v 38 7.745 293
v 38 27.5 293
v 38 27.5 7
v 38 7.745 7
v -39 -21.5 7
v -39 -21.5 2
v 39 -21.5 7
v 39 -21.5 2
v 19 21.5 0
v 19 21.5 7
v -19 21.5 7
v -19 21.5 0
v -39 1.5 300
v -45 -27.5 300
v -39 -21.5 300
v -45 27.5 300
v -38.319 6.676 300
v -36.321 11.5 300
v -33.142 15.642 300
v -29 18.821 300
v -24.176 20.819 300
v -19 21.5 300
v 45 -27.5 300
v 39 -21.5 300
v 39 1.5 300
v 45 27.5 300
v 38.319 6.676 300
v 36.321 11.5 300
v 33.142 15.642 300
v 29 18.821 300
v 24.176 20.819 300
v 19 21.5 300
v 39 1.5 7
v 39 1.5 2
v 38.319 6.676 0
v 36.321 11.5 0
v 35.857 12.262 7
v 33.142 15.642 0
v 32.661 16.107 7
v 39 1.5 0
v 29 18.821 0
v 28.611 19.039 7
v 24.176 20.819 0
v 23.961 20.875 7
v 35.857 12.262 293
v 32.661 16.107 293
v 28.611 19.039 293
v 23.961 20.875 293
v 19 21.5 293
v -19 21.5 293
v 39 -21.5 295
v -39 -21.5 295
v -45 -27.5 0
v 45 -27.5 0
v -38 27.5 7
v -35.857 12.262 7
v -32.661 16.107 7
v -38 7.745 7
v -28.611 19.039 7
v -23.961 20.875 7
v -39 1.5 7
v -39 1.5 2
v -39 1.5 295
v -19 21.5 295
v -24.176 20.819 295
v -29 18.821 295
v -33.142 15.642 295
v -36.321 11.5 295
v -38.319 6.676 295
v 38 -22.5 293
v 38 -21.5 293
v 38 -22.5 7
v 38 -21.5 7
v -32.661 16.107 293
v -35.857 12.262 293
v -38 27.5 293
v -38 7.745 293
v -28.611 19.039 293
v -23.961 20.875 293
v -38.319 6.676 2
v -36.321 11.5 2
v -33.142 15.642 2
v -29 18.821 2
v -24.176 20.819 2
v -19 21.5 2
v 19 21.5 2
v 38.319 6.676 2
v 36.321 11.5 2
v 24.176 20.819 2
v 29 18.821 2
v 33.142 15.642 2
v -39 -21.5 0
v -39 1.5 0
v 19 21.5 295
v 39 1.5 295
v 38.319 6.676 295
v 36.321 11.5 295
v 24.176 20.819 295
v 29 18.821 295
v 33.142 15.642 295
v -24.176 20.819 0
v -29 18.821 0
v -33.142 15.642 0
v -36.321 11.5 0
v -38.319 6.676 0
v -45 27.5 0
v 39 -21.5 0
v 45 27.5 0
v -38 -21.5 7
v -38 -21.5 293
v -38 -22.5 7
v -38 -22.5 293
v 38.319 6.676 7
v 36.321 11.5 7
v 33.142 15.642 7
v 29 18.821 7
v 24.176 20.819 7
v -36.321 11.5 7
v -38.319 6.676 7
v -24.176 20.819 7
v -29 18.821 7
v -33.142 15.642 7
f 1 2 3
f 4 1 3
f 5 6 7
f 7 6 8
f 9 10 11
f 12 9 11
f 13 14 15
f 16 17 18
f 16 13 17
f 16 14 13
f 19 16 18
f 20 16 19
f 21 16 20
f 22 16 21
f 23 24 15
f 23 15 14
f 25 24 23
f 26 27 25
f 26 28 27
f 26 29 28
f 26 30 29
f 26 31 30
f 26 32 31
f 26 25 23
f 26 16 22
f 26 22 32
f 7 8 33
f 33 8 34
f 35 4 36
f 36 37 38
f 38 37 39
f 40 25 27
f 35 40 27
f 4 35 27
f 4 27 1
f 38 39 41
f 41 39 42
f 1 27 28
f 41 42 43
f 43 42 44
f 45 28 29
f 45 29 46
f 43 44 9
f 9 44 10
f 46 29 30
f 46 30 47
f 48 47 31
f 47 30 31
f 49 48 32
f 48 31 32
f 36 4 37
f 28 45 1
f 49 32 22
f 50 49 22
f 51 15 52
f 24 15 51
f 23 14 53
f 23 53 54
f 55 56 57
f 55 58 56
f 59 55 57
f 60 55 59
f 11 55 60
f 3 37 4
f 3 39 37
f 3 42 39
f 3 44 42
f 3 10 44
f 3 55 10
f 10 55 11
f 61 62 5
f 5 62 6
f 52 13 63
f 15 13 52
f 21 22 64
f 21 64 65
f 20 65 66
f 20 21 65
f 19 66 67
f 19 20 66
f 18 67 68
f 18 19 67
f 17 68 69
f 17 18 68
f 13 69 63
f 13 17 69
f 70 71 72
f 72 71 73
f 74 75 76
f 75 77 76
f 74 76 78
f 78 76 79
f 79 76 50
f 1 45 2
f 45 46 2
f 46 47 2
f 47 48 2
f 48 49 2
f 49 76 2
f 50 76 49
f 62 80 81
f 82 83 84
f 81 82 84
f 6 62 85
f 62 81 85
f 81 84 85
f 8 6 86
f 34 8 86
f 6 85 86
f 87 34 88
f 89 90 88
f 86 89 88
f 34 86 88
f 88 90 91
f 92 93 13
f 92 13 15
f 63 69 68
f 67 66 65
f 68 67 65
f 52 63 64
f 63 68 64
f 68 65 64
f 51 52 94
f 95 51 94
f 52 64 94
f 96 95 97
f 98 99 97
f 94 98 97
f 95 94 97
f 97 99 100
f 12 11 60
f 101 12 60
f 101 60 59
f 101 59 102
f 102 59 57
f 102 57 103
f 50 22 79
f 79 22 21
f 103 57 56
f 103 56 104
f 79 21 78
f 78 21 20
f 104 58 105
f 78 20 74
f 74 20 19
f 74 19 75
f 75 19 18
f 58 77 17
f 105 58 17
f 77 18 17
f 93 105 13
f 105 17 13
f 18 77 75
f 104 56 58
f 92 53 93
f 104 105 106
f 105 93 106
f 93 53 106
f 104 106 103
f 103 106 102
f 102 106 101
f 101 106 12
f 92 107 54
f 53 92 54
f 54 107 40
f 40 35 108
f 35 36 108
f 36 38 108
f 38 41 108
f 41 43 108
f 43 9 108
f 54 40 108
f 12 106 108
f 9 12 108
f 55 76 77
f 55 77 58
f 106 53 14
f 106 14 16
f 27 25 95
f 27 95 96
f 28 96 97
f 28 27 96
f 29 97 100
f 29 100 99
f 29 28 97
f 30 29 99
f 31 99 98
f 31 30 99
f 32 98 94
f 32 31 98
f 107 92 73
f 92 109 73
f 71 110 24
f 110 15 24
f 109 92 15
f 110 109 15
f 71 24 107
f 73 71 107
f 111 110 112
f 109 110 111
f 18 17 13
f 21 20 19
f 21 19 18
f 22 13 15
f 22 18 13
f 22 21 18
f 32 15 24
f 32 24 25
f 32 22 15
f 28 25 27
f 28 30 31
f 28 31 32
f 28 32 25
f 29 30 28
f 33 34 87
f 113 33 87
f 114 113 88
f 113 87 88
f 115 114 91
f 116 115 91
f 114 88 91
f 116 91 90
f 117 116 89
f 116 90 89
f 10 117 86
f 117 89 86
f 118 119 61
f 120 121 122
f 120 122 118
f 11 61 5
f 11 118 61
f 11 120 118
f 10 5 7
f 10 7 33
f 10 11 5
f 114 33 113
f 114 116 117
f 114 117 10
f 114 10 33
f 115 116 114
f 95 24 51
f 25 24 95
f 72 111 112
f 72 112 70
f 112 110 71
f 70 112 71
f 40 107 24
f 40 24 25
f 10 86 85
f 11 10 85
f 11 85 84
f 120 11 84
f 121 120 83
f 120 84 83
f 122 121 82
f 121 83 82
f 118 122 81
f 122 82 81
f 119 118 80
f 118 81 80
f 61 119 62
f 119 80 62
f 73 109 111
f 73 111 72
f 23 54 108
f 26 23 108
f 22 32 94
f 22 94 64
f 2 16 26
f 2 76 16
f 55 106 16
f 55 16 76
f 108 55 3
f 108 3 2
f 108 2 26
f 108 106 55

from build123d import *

# Parameters (mm, degrees)
ESQUISSE1_W             = 90
ESQUISSE1_H             = 55
BOSS_EXTRU_1_DEPTH      = 300
ESQUISSE3_W             = 76
ESQUISSE3_H             = 286
ENL_V_MAT_EXTRU_1_DEPTH = 50
ENL_V_MAT_EXTRU_2_DEPTH = 475
BOSS_EXTRU_2_DEPTH      = 5


with BuildPart() as part:
    # Esquisse1 → Boss.-Extru.1 (new body)
    with BuildSketch(Plane.XY):
        Rectangle(ESQUISSE1_W, ESQUISSE1_H)
    extrude(amount=BOSS_EXTRU_1_DEPTH)

    # Esquisse3 → Enlèv. mat.-Extru.1 (cut)
    with BuildSketch(Plane(origin=(0, 27.5, 0), x_dir=(1, 0, 0), z_dir=(0, 1, 0))):
        with Locations((0, -150)):
            Rectangle(ESQUISSE3_W, ESQUISSE3_H)
    extrude(amount=-ENL_V_MAT_EXTRU_1_DEPTH, mode=Mode.SUBTRACT)

    # Esquisse4 → Enlèv. mat.-Extru.2 (cut)
    with BuildSketch(Plane.XY.offset(300)):
        with BuildLine():
            Line((-39, 1.5), (-39, -21.5))
            Line((-39, -21.5), (39, -21.5))
            Line((39, -21.5), (39, 1.5))
            ThreePointArc((39, 1.5), (33.142135624, 15.642135624), (19, 21.5))
            Line((19, 21.5), (-19, 21.5))
            ThreePointArc((-19, 21.5), (-33.142135624, 15.642135624), (-39, 1.5))
        make_face()
    extrude(amount=-ENL_V_MAT_EXTRU_2_DEPTH, mode=Mode.SUBTRACT)


with BuildPart() as body_2:
    # Esquisse5 → Boss.-Extru.2 (new body)
    with BuildSketch(Plane.XY.offset(300)):
        with BuildLine():
            Line((-39, 1.5), (-39, -21.5))
            Line((-39, -21.5), (39, -21.5))
            Line((39, -21.5), (39, 1.5))
            ThreePointArc((39, 1.5), (33.142135624, 15.642135624), (19, 21.5))
            Line((19, 21.5), (-19, 21.5))
            ThreePointArc((-19, 21.5), (-33.142135624, 15.642135624), (-39, 1.5))
        make_face()
    extrude(amount=-BOSS_EXTRU_2_DEPTH)


with BuildPart() as body_3:
    # Symétrie2: mirrored copy
    add(body_2.part.mirror(Plane(origin=(0, 0, 151), x_dir=(1, 0, 0), z_dir=(0, 0, -1))))


solid = Compound([part.part, body_2.part, body_3.part])
